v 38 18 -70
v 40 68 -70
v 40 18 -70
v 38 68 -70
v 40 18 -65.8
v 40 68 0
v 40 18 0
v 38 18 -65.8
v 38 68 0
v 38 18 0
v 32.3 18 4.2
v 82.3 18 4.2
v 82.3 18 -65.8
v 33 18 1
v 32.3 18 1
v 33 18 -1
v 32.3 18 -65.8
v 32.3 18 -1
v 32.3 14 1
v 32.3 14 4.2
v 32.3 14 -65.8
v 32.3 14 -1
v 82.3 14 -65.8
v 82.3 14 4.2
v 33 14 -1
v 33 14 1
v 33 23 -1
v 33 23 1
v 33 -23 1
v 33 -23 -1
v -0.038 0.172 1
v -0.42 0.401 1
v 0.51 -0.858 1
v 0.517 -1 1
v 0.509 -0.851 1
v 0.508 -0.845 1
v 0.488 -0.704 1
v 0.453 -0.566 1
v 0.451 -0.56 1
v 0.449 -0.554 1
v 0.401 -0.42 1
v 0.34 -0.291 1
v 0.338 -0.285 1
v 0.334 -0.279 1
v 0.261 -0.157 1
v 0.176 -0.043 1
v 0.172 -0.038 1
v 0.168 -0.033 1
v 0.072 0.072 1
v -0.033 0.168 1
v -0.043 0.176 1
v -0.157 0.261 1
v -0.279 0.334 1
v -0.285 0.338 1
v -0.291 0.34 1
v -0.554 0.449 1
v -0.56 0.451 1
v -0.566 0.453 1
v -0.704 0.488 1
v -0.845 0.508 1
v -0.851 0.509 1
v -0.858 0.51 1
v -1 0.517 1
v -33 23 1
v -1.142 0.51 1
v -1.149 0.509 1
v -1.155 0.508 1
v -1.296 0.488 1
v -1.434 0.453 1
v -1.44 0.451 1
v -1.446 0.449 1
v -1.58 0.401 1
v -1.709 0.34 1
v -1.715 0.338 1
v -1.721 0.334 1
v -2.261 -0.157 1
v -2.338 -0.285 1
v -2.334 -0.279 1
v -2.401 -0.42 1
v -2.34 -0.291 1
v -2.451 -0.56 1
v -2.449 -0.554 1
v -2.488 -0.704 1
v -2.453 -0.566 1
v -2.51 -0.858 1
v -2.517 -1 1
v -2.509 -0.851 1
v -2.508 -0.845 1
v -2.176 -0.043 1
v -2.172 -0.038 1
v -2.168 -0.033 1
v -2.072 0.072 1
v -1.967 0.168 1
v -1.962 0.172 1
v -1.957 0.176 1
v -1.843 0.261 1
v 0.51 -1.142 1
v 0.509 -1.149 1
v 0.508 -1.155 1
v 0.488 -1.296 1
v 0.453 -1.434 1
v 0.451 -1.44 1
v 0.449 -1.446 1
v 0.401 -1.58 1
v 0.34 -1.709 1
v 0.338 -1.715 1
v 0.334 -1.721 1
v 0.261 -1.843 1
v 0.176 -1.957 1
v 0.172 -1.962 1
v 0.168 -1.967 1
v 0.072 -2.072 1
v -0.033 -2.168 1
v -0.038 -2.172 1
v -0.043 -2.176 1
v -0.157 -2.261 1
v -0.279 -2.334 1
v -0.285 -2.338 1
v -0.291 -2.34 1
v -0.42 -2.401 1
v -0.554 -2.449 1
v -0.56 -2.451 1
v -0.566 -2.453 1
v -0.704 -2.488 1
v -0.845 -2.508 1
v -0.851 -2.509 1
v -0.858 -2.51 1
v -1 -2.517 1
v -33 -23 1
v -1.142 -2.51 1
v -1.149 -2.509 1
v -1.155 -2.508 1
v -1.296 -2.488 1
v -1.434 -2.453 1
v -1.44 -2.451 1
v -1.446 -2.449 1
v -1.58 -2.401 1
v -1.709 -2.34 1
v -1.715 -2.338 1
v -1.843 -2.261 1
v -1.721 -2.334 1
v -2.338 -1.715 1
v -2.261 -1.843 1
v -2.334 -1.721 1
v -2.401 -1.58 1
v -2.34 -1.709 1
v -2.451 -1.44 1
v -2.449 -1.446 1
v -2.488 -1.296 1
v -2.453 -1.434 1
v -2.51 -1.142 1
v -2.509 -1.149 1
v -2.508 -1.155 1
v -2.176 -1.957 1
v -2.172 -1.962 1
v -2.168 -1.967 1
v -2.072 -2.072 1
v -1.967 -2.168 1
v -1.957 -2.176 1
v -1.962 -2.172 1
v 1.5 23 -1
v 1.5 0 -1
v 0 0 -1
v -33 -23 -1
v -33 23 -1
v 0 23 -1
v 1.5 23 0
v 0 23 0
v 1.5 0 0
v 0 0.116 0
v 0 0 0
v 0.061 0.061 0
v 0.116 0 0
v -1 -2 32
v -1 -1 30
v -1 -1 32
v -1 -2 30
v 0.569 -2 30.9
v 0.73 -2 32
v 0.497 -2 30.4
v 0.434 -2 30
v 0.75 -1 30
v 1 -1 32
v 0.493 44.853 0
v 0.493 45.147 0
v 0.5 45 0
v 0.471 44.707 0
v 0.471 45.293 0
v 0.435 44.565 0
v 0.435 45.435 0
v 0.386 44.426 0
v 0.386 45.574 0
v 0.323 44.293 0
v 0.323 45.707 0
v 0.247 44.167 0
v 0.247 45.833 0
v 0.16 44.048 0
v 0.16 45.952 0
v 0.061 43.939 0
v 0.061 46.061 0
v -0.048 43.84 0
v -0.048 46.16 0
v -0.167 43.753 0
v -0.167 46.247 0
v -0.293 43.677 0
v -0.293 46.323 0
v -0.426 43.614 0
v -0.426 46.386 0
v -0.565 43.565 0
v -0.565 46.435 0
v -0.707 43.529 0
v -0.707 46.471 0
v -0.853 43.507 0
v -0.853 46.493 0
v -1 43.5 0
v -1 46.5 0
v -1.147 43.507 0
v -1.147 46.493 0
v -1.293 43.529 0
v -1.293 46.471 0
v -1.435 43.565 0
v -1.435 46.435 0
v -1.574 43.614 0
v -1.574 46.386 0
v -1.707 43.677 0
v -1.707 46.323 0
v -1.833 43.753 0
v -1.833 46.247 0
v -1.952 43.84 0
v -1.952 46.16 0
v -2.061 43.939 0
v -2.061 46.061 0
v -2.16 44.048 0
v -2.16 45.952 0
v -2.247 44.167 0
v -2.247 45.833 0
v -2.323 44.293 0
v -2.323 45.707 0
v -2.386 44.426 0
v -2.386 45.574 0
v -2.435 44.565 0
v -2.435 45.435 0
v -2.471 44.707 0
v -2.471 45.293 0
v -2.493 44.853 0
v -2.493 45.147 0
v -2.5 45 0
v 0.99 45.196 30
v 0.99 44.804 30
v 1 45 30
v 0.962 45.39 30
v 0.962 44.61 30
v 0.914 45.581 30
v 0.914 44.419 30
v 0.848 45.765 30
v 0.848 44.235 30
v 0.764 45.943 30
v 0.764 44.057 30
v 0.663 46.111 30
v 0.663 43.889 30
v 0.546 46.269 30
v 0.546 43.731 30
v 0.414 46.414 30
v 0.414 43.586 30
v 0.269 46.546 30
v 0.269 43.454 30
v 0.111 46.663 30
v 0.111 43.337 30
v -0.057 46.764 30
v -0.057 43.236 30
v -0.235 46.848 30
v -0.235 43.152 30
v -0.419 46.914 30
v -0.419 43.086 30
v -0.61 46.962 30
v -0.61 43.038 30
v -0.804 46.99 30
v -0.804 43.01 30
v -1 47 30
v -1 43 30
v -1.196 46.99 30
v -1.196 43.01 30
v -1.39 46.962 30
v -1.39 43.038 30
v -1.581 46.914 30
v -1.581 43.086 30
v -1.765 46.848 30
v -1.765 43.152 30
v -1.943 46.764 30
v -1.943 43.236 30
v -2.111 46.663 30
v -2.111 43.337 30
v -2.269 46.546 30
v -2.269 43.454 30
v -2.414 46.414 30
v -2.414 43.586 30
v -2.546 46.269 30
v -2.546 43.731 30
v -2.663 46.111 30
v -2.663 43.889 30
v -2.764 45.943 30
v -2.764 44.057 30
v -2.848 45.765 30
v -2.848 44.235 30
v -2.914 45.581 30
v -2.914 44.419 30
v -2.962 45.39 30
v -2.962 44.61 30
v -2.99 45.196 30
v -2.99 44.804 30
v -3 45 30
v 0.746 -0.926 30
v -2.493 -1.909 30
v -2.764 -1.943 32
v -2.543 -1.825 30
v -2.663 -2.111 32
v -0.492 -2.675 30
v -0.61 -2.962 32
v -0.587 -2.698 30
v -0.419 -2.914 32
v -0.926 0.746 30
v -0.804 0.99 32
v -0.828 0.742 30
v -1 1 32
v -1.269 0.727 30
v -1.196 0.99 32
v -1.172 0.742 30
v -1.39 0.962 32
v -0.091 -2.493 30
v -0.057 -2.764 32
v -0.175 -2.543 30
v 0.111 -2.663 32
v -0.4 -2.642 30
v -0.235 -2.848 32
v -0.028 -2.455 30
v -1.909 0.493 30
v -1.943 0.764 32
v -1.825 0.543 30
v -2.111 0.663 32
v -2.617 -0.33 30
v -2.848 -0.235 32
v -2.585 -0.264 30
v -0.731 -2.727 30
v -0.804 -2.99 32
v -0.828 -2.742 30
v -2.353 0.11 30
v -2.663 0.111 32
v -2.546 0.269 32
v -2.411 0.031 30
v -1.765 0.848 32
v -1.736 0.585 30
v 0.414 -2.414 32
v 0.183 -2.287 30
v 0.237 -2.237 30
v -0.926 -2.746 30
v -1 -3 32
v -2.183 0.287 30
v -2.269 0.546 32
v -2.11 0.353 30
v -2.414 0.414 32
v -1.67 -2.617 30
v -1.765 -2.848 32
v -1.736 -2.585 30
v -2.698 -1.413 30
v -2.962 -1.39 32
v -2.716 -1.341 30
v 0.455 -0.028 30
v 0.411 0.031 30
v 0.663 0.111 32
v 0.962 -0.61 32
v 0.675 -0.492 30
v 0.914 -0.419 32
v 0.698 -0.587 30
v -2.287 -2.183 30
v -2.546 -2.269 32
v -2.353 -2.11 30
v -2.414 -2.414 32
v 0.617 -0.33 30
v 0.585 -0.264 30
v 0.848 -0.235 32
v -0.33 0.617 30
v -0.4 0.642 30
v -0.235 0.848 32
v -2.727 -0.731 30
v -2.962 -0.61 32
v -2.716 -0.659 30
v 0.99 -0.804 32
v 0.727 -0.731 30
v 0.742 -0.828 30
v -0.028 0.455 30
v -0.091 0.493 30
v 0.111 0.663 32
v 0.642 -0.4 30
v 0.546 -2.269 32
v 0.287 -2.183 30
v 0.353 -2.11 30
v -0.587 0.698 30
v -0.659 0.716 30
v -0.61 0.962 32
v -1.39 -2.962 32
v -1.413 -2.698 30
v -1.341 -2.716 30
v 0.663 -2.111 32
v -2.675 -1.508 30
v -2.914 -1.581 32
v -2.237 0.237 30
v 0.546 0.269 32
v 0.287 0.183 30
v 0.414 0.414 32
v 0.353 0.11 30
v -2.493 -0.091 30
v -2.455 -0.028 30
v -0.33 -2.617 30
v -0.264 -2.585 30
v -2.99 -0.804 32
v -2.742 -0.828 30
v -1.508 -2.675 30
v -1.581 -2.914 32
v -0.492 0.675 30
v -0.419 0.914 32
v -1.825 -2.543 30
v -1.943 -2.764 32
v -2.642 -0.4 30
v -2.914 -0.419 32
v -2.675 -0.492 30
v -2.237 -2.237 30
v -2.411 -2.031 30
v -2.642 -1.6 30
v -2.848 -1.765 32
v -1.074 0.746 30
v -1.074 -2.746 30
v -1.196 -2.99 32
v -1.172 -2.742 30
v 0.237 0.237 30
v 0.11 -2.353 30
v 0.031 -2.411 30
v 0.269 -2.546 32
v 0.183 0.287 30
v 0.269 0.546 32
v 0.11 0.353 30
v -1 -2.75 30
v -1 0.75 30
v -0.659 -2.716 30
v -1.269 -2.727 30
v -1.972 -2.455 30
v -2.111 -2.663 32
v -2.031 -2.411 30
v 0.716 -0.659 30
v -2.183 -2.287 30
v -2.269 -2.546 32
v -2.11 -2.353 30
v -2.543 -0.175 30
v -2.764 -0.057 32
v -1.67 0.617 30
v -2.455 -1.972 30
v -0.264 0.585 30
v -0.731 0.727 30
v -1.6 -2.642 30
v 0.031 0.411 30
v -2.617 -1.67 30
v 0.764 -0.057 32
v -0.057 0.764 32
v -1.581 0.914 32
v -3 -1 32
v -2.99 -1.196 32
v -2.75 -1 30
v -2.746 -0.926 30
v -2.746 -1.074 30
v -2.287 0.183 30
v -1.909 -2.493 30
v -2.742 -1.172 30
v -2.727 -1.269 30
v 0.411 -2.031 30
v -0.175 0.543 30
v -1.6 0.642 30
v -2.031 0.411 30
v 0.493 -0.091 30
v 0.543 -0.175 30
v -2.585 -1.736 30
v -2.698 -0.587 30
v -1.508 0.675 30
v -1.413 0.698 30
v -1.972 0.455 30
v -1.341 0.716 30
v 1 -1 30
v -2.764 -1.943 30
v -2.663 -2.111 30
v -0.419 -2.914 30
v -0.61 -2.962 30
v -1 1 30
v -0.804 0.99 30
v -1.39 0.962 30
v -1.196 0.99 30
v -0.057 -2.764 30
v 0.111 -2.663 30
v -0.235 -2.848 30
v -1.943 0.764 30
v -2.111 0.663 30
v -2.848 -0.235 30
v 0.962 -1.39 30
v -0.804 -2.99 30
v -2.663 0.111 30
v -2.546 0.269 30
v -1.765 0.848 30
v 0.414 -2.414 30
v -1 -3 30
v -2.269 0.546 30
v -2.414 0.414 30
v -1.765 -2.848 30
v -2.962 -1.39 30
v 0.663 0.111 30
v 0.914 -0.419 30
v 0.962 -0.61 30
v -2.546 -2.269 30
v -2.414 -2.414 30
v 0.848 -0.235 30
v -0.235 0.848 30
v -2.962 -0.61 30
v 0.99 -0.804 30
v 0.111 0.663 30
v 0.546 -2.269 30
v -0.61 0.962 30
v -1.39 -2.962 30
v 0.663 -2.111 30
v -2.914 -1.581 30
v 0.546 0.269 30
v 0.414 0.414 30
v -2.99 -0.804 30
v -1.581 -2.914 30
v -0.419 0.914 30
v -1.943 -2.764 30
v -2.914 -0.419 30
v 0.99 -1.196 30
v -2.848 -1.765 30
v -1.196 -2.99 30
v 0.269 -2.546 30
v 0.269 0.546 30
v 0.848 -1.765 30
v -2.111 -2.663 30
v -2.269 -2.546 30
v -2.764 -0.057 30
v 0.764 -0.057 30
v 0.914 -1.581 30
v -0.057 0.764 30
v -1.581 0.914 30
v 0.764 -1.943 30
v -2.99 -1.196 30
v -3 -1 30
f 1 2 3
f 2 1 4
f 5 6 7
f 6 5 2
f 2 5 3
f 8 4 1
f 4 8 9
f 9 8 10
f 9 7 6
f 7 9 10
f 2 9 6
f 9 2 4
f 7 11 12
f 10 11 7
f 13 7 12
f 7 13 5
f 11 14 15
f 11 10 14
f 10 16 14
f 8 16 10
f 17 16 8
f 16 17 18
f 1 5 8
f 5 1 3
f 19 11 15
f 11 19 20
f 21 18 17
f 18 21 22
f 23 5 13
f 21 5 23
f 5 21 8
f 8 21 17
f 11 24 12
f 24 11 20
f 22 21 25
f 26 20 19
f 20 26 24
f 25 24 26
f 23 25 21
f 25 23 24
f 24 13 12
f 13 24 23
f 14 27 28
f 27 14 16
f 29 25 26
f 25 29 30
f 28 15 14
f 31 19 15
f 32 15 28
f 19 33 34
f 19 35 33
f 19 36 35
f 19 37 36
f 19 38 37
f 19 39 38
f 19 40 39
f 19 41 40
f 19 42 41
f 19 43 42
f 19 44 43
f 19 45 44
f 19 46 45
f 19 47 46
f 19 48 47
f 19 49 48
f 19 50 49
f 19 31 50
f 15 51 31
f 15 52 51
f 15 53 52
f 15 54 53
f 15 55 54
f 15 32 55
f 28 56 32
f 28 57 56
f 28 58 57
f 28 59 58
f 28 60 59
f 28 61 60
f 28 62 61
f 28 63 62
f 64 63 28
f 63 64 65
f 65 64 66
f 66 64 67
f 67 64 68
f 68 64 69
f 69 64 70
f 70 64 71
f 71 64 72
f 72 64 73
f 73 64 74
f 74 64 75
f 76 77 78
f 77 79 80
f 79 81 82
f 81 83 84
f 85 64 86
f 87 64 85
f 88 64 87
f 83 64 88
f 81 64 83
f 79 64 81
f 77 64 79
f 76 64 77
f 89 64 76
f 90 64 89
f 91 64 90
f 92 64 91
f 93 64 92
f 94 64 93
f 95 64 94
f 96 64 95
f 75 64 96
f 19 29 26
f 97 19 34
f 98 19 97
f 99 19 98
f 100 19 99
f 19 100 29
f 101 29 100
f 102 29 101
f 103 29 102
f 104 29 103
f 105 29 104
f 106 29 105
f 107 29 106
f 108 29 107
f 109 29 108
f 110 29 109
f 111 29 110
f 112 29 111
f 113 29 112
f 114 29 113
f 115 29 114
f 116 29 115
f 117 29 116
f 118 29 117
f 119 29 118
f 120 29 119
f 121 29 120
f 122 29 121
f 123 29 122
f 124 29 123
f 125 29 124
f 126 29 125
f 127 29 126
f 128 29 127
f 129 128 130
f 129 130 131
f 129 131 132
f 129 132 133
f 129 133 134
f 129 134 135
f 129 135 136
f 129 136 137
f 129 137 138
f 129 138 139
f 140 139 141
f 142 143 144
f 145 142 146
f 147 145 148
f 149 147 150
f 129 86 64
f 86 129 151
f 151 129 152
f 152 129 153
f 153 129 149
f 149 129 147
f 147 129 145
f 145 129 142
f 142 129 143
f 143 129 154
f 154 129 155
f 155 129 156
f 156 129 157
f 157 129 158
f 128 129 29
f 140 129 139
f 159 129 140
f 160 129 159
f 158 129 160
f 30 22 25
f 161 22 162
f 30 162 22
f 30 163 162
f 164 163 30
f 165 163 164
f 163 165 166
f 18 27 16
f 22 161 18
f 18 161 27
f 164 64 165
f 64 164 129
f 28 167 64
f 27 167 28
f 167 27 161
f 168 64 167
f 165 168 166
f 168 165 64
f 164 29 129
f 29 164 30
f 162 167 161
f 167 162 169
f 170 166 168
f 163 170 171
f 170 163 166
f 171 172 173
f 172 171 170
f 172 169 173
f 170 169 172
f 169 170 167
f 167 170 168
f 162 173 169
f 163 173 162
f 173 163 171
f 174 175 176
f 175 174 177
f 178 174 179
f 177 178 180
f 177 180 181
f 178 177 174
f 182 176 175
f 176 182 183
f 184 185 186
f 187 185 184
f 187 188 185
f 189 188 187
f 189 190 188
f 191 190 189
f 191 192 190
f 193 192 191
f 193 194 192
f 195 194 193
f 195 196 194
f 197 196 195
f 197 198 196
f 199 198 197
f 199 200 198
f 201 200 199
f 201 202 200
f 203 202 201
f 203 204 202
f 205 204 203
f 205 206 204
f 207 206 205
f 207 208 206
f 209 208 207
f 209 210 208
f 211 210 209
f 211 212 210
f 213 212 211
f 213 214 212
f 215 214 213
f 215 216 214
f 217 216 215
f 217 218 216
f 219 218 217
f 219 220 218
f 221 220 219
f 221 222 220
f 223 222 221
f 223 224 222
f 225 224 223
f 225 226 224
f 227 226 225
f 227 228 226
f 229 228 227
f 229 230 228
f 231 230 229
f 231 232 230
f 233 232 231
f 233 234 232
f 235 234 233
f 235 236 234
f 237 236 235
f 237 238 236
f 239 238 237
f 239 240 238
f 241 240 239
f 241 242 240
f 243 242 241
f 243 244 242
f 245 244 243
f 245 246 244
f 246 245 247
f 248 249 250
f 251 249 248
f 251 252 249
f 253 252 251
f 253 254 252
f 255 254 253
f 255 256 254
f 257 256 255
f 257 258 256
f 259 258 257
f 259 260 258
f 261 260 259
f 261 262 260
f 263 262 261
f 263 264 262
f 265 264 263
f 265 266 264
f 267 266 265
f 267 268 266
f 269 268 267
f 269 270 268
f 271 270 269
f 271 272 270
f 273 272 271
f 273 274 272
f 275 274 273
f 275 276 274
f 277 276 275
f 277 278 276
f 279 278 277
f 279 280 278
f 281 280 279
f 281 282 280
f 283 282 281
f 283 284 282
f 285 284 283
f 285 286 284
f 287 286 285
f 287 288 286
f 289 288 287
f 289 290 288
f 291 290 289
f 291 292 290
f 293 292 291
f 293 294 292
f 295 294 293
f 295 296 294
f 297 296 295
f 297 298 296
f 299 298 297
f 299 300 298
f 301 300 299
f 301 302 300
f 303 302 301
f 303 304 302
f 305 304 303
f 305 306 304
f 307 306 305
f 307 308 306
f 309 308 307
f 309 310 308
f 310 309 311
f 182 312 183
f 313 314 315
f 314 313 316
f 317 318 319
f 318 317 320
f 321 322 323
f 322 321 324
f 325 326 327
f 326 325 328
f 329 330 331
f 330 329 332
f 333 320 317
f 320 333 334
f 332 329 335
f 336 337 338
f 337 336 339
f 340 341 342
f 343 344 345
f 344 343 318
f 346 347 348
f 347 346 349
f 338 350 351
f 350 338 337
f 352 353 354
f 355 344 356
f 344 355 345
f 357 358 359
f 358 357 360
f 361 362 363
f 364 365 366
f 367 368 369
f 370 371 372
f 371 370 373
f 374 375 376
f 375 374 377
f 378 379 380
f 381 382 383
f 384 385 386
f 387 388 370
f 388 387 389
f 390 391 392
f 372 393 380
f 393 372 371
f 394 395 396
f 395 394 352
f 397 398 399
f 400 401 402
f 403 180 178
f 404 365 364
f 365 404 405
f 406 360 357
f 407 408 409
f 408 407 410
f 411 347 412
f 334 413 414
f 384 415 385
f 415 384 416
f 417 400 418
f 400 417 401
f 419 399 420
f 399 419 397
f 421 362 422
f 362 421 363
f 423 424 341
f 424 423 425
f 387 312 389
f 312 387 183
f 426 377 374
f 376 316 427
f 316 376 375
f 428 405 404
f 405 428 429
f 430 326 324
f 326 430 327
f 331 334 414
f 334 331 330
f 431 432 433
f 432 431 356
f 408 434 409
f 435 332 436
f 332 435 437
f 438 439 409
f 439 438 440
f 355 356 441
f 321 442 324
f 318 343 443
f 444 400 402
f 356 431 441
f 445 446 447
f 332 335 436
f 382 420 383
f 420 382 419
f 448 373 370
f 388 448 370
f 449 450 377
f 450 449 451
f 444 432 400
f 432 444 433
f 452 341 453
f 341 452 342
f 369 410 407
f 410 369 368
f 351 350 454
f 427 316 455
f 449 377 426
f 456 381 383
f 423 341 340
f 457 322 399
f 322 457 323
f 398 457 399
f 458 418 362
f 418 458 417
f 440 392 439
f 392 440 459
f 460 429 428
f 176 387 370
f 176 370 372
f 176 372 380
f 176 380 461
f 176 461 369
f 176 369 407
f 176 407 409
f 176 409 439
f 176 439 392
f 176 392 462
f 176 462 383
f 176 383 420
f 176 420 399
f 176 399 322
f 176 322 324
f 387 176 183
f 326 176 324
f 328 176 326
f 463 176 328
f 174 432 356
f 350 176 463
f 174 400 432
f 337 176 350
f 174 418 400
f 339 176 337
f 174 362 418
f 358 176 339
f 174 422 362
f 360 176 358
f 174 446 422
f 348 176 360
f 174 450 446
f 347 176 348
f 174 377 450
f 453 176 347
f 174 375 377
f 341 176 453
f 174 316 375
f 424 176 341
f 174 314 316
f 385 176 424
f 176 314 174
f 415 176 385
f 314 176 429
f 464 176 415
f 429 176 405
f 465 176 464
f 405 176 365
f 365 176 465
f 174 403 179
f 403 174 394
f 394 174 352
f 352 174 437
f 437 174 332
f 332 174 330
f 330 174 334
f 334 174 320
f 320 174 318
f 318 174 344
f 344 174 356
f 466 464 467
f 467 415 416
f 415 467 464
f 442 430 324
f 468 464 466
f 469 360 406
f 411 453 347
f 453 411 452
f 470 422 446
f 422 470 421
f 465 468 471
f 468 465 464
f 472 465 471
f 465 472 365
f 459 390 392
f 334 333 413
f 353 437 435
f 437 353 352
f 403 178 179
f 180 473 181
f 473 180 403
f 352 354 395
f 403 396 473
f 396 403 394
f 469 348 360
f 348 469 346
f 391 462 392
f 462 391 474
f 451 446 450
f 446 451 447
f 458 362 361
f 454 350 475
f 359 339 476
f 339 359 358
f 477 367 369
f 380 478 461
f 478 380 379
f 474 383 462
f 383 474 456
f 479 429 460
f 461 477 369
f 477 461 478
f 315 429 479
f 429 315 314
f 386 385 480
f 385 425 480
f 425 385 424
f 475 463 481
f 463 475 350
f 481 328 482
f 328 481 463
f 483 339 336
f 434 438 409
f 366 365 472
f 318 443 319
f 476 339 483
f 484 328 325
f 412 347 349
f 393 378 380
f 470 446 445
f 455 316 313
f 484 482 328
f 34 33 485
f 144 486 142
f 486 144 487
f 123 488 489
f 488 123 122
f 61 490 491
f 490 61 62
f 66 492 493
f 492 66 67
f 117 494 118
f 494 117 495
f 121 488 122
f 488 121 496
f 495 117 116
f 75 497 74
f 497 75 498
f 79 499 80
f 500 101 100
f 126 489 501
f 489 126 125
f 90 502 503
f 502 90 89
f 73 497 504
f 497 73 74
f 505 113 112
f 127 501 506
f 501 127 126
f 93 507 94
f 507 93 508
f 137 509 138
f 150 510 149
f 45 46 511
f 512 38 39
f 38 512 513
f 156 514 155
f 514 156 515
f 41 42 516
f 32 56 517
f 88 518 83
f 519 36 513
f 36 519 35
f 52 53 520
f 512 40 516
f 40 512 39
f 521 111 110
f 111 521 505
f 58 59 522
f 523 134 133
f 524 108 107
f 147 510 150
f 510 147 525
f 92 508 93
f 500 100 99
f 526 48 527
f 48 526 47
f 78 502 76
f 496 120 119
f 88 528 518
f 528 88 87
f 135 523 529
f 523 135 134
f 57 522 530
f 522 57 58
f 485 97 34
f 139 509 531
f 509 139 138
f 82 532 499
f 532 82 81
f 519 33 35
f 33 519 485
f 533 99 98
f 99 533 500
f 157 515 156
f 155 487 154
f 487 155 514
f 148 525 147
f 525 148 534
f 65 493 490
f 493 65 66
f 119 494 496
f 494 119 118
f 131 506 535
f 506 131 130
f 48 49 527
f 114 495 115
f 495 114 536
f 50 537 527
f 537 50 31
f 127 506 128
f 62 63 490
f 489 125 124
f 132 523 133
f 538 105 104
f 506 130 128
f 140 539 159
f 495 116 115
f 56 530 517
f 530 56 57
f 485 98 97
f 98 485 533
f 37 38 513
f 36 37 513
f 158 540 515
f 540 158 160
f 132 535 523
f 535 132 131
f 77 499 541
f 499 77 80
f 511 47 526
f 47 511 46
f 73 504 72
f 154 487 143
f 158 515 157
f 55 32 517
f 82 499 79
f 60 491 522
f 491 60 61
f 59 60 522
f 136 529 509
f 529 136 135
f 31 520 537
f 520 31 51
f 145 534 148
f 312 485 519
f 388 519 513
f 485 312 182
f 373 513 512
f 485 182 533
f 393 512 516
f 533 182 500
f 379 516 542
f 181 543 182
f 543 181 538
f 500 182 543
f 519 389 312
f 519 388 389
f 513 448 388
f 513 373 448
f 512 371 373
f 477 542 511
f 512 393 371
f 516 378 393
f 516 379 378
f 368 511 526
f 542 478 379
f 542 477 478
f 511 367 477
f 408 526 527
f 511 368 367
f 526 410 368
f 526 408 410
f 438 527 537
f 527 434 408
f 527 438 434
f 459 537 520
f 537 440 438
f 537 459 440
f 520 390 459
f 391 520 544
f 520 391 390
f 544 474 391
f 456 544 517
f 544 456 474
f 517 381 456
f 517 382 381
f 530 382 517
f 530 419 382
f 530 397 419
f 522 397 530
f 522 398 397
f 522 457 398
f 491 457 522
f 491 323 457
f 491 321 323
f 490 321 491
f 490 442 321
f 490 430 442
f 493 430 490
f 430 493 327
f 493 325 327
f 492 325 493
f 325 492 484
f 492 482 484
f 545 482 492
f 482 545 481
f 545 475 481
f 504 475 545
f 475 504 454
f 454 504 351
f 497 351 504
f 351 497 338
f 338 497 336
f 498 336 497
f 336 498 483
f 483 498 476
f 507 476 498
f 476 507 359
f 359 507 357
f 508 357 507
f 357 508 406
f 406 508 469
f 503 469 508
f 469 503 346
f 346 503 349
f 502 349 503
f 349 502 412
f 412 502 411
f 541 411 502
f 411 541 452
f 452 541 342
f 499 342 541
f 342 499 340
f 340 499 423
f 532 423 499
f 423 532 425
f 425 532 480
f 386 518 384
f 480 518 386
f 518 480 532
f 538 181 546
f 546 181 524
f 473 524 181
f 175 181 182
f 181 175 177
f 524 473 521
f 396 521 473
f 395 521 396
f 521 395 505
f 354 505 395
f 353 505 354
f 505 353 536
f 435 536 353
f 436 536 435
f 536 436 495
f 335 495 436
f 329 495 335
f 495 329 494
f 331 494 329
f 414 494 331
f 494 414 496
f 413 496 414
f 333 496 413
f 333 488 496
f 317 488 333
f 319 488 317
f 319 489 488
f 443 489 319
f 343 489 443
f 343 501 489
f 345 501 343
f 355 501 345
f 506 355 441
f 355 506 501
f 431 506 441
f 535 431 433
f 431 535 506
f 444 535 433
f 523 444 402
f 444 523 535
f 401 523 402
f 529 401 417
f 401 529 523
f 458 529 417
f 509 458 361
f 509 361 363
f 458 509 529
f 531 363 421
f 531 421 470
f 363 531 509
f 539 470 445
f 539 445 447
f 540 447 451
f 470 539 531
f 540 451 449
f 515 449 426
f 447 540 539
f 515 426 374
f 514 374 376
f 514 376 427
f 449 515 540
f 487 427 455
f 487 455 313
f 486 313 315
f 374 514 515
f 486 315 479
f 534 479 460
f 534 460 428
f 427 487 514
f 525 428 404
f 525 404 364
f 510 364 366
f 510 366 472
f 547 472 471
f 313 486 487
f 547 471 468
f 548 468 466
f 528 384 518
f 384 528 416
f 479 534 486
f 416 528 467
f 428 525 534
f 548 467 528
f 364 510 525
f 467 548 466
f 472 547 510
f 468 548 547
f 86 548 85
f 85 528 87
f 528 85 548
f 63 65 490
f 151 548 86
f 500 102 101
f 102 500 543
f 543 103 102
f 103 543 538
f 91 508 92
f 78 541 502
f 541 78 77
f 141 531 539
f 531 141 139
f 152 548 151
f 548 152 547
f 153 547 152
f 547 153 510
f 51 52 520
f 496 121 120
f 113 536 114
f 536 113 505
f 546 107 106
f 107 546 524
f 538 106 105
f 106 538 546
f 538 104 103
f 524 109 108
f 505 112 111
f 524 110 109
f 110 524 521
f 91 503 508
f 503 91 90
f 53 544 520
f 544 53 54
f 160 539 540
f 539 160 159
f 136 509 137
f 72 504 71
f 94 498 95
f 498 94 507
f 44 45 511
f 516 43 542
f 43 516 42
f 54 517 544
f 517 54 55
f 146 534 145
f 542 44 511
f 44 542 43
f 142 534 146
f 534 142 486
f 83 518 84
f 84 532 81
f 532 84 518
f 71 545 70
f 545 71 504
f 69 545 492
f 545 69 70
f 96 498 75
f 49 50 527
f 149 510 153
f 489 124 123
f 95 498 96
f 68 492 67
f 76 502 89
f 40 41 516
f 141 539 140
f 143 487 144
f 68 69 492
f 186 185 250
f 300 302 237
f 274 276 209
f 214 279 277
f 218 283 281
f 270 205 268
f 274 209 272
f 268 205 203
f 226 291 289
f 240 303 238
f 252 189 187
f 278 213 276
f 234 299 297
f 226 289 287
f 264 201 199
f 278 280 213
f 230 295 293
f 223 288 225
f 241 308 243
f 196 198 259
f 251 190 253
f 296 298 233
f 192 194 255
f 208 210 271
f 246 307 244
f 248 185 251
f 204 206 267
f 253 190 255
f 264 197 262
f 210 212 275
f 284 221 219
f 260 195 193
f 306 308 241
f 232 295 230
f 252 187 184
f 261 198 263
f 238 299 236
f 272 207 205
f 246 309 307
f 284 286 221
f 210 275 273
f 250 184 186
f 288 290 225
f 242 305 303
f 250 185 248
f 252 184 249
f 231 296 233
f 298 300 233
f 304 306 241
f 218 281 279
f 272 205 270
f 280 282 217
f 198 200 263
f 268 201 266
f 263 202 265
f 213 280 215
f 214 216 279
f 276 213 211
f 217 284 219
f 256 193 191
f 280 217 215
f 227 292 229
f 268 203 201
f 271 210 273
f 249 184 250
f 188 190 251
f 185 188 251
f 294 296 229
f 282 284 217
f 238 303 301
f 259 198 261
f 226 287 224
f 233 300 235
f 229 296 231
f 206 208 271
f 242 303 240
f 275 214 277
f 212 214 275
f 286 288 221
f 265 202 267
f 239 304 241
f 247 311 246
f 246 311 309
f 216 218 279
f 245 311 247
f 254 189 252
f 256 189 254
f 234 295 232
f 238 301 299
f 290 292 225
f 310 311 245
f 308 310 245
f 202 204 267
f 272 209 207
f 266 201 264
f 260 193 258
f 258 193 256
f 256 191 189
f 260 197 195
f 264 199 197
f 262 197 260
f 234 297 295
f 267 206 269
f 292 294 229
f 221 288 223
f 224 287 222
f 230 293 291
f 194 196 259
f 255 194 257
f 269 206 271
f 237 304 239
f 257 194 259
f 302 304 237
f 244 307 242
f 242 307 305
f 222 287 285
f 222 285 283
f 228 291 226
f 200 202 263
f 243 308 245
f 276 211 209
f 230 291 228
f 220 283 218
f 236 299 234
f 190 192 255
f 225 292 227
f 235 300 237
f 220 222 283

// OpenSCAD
// Dimensions for Part 1: Box (outer size 70x50x30mm, walls=2mm, floor=2mm)
$fn = 64;
box_part_width = 70 - 2 * 2;      // Inner width after wall subtraction
box_part_depth = 50 - 2 * 2;     // Inner depth after wall subtraction
box_height = 30 - 2;             // Height including floor

// Part 1: Box (open top)
module box() {
    translate([0, 0, 0]) {
        // Floor
        difference() {
            cube([box_part_width, box_part_depth, 2], center=true);
            rotate([0, 90, 0])
                cube([box_part_width, box_part_depth, 1.5]);
        }

        // Walls (left and right)
        translate([-1, -1, 0]) {
            difference() {
                cylinder(h=box_height + 2, r1=1, r2=1.5);
                rotate([90, 0, 0])
                    cube([box_part_width, box_part_depth, 1]);
            }
        }

        translate([-1, box_part_depth - 1, 0]) {
            difference() {
                cylinder(h=box_height + 2, r1=1, r2=1.5);
                rotate([90, 0, 0])
                    cube([box_part_width, box_part_depth, 1]);
            }
        }

        // Top wall (open)
        translate([-1, -1, box_height]) {
            difference() {
                cylinder(h=4, r1=1.5, r2=2);
                rotate([90, 0, 0])
                    cube([box_part_width + 2, box_part_depth + 2, 1]);
            }
        }

        // Front and back walls
        translate([-1, -1, 0]) {
            cylinder(h=box_height + 2, r1=1.5, r2=2);
        }

        translate([-1, box_part_depth - 1, 0]) {
            cylinder(h=box_height + 2, r1=1.5, r2=2);
        }
    }
}

// Dimensions for Part 2: Lid (plate + lip)
lid_plate_width = 70;
lid_plate_depth = 50;
lid_lip_inner_size_x = 65.6 - 4; // Clearance on each side
lid_lip_inner_size_y = 45.6 - 4;
lid_lip_height = 4;
lid_lip_thickness = 1.5;

// Part 2: Lid (upside down)
module lid() {
    translate([0, 0, 0]) {
        // Plate
        cube([lid_plate_width, lid_plate_depth, 2]);

        // Lip (cut from plate)
        difference() {
            rotate([0, 90, 0])
                linear_extrude(height=lid_lip_height) {
                    polygon(points=[
                        [-lid_lip_inner_size_x / 2, -lid_lip_inner_size_y / 2],
                        [ lid_lip_inner_size_x / 2, -lid_lip_inner_size_y / 2],
                        [ lid_lip_inner_size_x / 2,  lid_lip_inner_size_y / 2],
                        [-lid_lip_inner_size_x / 2,  lid_lip_inner_size_y / 2]
                    ]);
                }
            rotate([0, 90, 0])
                linear_extrude(height=lid_lip_height) {
                    polygon(points=[
                        [-lid_plate_width / 2, -lid_plate_depth / 2],
                        [ lid_plate_width / 2, -lid_plate_depth / 2],
                        [ lid_plate_width / 2,  lid_plate_depth / 2],
                        [-lid_plate_width / 2,  lid_plate_depth / 2]
                    ]);
                }
        }

        // Cut out the lip material
        translate([0, 0, -lid_lip_thickness])
            rotate([90, 0, 0])
            linear_extrude(height=lid_lip_height) {
                polygon(points=[
                    [-lid_plate_width / 2 + lid_lip_inner_size_x / 2,
                     -lid_plate_depth / 2 + lid_lip_inner_size_y / 2],
                    [ lid_plate_width / 2 + lid_lip_inner_size_x / 2,
                     -lid_plate_depth / 2 + lid_lip_inner_size_y / 2],
                    [ lid_plate_width / 2 + lid_lip_inner_size_x / 2,
                      lid_plate_depth / 2 + lid_lip_inner_size_y / 2],
                    [-lid_plate_width / 2 + lid_lip_inner_size_x / 2,
                      lid_plate_depth / 2 + lid_lip_inner_size_y / 2]
                ]);
            }
    }
}

// Combined assembly: Box and Lid (10mm gap)
translate([box_part_width/2 + 5, box_part_depth/2 - 5, 0]) {
    rotate([0, 90, 0])
        lid();
}

union() {
    box();
    translate([box_part_width/2 + 5, box_part_depth/2 - 5, 0])
        rotate([0, 90, 0])
            lid();
}
